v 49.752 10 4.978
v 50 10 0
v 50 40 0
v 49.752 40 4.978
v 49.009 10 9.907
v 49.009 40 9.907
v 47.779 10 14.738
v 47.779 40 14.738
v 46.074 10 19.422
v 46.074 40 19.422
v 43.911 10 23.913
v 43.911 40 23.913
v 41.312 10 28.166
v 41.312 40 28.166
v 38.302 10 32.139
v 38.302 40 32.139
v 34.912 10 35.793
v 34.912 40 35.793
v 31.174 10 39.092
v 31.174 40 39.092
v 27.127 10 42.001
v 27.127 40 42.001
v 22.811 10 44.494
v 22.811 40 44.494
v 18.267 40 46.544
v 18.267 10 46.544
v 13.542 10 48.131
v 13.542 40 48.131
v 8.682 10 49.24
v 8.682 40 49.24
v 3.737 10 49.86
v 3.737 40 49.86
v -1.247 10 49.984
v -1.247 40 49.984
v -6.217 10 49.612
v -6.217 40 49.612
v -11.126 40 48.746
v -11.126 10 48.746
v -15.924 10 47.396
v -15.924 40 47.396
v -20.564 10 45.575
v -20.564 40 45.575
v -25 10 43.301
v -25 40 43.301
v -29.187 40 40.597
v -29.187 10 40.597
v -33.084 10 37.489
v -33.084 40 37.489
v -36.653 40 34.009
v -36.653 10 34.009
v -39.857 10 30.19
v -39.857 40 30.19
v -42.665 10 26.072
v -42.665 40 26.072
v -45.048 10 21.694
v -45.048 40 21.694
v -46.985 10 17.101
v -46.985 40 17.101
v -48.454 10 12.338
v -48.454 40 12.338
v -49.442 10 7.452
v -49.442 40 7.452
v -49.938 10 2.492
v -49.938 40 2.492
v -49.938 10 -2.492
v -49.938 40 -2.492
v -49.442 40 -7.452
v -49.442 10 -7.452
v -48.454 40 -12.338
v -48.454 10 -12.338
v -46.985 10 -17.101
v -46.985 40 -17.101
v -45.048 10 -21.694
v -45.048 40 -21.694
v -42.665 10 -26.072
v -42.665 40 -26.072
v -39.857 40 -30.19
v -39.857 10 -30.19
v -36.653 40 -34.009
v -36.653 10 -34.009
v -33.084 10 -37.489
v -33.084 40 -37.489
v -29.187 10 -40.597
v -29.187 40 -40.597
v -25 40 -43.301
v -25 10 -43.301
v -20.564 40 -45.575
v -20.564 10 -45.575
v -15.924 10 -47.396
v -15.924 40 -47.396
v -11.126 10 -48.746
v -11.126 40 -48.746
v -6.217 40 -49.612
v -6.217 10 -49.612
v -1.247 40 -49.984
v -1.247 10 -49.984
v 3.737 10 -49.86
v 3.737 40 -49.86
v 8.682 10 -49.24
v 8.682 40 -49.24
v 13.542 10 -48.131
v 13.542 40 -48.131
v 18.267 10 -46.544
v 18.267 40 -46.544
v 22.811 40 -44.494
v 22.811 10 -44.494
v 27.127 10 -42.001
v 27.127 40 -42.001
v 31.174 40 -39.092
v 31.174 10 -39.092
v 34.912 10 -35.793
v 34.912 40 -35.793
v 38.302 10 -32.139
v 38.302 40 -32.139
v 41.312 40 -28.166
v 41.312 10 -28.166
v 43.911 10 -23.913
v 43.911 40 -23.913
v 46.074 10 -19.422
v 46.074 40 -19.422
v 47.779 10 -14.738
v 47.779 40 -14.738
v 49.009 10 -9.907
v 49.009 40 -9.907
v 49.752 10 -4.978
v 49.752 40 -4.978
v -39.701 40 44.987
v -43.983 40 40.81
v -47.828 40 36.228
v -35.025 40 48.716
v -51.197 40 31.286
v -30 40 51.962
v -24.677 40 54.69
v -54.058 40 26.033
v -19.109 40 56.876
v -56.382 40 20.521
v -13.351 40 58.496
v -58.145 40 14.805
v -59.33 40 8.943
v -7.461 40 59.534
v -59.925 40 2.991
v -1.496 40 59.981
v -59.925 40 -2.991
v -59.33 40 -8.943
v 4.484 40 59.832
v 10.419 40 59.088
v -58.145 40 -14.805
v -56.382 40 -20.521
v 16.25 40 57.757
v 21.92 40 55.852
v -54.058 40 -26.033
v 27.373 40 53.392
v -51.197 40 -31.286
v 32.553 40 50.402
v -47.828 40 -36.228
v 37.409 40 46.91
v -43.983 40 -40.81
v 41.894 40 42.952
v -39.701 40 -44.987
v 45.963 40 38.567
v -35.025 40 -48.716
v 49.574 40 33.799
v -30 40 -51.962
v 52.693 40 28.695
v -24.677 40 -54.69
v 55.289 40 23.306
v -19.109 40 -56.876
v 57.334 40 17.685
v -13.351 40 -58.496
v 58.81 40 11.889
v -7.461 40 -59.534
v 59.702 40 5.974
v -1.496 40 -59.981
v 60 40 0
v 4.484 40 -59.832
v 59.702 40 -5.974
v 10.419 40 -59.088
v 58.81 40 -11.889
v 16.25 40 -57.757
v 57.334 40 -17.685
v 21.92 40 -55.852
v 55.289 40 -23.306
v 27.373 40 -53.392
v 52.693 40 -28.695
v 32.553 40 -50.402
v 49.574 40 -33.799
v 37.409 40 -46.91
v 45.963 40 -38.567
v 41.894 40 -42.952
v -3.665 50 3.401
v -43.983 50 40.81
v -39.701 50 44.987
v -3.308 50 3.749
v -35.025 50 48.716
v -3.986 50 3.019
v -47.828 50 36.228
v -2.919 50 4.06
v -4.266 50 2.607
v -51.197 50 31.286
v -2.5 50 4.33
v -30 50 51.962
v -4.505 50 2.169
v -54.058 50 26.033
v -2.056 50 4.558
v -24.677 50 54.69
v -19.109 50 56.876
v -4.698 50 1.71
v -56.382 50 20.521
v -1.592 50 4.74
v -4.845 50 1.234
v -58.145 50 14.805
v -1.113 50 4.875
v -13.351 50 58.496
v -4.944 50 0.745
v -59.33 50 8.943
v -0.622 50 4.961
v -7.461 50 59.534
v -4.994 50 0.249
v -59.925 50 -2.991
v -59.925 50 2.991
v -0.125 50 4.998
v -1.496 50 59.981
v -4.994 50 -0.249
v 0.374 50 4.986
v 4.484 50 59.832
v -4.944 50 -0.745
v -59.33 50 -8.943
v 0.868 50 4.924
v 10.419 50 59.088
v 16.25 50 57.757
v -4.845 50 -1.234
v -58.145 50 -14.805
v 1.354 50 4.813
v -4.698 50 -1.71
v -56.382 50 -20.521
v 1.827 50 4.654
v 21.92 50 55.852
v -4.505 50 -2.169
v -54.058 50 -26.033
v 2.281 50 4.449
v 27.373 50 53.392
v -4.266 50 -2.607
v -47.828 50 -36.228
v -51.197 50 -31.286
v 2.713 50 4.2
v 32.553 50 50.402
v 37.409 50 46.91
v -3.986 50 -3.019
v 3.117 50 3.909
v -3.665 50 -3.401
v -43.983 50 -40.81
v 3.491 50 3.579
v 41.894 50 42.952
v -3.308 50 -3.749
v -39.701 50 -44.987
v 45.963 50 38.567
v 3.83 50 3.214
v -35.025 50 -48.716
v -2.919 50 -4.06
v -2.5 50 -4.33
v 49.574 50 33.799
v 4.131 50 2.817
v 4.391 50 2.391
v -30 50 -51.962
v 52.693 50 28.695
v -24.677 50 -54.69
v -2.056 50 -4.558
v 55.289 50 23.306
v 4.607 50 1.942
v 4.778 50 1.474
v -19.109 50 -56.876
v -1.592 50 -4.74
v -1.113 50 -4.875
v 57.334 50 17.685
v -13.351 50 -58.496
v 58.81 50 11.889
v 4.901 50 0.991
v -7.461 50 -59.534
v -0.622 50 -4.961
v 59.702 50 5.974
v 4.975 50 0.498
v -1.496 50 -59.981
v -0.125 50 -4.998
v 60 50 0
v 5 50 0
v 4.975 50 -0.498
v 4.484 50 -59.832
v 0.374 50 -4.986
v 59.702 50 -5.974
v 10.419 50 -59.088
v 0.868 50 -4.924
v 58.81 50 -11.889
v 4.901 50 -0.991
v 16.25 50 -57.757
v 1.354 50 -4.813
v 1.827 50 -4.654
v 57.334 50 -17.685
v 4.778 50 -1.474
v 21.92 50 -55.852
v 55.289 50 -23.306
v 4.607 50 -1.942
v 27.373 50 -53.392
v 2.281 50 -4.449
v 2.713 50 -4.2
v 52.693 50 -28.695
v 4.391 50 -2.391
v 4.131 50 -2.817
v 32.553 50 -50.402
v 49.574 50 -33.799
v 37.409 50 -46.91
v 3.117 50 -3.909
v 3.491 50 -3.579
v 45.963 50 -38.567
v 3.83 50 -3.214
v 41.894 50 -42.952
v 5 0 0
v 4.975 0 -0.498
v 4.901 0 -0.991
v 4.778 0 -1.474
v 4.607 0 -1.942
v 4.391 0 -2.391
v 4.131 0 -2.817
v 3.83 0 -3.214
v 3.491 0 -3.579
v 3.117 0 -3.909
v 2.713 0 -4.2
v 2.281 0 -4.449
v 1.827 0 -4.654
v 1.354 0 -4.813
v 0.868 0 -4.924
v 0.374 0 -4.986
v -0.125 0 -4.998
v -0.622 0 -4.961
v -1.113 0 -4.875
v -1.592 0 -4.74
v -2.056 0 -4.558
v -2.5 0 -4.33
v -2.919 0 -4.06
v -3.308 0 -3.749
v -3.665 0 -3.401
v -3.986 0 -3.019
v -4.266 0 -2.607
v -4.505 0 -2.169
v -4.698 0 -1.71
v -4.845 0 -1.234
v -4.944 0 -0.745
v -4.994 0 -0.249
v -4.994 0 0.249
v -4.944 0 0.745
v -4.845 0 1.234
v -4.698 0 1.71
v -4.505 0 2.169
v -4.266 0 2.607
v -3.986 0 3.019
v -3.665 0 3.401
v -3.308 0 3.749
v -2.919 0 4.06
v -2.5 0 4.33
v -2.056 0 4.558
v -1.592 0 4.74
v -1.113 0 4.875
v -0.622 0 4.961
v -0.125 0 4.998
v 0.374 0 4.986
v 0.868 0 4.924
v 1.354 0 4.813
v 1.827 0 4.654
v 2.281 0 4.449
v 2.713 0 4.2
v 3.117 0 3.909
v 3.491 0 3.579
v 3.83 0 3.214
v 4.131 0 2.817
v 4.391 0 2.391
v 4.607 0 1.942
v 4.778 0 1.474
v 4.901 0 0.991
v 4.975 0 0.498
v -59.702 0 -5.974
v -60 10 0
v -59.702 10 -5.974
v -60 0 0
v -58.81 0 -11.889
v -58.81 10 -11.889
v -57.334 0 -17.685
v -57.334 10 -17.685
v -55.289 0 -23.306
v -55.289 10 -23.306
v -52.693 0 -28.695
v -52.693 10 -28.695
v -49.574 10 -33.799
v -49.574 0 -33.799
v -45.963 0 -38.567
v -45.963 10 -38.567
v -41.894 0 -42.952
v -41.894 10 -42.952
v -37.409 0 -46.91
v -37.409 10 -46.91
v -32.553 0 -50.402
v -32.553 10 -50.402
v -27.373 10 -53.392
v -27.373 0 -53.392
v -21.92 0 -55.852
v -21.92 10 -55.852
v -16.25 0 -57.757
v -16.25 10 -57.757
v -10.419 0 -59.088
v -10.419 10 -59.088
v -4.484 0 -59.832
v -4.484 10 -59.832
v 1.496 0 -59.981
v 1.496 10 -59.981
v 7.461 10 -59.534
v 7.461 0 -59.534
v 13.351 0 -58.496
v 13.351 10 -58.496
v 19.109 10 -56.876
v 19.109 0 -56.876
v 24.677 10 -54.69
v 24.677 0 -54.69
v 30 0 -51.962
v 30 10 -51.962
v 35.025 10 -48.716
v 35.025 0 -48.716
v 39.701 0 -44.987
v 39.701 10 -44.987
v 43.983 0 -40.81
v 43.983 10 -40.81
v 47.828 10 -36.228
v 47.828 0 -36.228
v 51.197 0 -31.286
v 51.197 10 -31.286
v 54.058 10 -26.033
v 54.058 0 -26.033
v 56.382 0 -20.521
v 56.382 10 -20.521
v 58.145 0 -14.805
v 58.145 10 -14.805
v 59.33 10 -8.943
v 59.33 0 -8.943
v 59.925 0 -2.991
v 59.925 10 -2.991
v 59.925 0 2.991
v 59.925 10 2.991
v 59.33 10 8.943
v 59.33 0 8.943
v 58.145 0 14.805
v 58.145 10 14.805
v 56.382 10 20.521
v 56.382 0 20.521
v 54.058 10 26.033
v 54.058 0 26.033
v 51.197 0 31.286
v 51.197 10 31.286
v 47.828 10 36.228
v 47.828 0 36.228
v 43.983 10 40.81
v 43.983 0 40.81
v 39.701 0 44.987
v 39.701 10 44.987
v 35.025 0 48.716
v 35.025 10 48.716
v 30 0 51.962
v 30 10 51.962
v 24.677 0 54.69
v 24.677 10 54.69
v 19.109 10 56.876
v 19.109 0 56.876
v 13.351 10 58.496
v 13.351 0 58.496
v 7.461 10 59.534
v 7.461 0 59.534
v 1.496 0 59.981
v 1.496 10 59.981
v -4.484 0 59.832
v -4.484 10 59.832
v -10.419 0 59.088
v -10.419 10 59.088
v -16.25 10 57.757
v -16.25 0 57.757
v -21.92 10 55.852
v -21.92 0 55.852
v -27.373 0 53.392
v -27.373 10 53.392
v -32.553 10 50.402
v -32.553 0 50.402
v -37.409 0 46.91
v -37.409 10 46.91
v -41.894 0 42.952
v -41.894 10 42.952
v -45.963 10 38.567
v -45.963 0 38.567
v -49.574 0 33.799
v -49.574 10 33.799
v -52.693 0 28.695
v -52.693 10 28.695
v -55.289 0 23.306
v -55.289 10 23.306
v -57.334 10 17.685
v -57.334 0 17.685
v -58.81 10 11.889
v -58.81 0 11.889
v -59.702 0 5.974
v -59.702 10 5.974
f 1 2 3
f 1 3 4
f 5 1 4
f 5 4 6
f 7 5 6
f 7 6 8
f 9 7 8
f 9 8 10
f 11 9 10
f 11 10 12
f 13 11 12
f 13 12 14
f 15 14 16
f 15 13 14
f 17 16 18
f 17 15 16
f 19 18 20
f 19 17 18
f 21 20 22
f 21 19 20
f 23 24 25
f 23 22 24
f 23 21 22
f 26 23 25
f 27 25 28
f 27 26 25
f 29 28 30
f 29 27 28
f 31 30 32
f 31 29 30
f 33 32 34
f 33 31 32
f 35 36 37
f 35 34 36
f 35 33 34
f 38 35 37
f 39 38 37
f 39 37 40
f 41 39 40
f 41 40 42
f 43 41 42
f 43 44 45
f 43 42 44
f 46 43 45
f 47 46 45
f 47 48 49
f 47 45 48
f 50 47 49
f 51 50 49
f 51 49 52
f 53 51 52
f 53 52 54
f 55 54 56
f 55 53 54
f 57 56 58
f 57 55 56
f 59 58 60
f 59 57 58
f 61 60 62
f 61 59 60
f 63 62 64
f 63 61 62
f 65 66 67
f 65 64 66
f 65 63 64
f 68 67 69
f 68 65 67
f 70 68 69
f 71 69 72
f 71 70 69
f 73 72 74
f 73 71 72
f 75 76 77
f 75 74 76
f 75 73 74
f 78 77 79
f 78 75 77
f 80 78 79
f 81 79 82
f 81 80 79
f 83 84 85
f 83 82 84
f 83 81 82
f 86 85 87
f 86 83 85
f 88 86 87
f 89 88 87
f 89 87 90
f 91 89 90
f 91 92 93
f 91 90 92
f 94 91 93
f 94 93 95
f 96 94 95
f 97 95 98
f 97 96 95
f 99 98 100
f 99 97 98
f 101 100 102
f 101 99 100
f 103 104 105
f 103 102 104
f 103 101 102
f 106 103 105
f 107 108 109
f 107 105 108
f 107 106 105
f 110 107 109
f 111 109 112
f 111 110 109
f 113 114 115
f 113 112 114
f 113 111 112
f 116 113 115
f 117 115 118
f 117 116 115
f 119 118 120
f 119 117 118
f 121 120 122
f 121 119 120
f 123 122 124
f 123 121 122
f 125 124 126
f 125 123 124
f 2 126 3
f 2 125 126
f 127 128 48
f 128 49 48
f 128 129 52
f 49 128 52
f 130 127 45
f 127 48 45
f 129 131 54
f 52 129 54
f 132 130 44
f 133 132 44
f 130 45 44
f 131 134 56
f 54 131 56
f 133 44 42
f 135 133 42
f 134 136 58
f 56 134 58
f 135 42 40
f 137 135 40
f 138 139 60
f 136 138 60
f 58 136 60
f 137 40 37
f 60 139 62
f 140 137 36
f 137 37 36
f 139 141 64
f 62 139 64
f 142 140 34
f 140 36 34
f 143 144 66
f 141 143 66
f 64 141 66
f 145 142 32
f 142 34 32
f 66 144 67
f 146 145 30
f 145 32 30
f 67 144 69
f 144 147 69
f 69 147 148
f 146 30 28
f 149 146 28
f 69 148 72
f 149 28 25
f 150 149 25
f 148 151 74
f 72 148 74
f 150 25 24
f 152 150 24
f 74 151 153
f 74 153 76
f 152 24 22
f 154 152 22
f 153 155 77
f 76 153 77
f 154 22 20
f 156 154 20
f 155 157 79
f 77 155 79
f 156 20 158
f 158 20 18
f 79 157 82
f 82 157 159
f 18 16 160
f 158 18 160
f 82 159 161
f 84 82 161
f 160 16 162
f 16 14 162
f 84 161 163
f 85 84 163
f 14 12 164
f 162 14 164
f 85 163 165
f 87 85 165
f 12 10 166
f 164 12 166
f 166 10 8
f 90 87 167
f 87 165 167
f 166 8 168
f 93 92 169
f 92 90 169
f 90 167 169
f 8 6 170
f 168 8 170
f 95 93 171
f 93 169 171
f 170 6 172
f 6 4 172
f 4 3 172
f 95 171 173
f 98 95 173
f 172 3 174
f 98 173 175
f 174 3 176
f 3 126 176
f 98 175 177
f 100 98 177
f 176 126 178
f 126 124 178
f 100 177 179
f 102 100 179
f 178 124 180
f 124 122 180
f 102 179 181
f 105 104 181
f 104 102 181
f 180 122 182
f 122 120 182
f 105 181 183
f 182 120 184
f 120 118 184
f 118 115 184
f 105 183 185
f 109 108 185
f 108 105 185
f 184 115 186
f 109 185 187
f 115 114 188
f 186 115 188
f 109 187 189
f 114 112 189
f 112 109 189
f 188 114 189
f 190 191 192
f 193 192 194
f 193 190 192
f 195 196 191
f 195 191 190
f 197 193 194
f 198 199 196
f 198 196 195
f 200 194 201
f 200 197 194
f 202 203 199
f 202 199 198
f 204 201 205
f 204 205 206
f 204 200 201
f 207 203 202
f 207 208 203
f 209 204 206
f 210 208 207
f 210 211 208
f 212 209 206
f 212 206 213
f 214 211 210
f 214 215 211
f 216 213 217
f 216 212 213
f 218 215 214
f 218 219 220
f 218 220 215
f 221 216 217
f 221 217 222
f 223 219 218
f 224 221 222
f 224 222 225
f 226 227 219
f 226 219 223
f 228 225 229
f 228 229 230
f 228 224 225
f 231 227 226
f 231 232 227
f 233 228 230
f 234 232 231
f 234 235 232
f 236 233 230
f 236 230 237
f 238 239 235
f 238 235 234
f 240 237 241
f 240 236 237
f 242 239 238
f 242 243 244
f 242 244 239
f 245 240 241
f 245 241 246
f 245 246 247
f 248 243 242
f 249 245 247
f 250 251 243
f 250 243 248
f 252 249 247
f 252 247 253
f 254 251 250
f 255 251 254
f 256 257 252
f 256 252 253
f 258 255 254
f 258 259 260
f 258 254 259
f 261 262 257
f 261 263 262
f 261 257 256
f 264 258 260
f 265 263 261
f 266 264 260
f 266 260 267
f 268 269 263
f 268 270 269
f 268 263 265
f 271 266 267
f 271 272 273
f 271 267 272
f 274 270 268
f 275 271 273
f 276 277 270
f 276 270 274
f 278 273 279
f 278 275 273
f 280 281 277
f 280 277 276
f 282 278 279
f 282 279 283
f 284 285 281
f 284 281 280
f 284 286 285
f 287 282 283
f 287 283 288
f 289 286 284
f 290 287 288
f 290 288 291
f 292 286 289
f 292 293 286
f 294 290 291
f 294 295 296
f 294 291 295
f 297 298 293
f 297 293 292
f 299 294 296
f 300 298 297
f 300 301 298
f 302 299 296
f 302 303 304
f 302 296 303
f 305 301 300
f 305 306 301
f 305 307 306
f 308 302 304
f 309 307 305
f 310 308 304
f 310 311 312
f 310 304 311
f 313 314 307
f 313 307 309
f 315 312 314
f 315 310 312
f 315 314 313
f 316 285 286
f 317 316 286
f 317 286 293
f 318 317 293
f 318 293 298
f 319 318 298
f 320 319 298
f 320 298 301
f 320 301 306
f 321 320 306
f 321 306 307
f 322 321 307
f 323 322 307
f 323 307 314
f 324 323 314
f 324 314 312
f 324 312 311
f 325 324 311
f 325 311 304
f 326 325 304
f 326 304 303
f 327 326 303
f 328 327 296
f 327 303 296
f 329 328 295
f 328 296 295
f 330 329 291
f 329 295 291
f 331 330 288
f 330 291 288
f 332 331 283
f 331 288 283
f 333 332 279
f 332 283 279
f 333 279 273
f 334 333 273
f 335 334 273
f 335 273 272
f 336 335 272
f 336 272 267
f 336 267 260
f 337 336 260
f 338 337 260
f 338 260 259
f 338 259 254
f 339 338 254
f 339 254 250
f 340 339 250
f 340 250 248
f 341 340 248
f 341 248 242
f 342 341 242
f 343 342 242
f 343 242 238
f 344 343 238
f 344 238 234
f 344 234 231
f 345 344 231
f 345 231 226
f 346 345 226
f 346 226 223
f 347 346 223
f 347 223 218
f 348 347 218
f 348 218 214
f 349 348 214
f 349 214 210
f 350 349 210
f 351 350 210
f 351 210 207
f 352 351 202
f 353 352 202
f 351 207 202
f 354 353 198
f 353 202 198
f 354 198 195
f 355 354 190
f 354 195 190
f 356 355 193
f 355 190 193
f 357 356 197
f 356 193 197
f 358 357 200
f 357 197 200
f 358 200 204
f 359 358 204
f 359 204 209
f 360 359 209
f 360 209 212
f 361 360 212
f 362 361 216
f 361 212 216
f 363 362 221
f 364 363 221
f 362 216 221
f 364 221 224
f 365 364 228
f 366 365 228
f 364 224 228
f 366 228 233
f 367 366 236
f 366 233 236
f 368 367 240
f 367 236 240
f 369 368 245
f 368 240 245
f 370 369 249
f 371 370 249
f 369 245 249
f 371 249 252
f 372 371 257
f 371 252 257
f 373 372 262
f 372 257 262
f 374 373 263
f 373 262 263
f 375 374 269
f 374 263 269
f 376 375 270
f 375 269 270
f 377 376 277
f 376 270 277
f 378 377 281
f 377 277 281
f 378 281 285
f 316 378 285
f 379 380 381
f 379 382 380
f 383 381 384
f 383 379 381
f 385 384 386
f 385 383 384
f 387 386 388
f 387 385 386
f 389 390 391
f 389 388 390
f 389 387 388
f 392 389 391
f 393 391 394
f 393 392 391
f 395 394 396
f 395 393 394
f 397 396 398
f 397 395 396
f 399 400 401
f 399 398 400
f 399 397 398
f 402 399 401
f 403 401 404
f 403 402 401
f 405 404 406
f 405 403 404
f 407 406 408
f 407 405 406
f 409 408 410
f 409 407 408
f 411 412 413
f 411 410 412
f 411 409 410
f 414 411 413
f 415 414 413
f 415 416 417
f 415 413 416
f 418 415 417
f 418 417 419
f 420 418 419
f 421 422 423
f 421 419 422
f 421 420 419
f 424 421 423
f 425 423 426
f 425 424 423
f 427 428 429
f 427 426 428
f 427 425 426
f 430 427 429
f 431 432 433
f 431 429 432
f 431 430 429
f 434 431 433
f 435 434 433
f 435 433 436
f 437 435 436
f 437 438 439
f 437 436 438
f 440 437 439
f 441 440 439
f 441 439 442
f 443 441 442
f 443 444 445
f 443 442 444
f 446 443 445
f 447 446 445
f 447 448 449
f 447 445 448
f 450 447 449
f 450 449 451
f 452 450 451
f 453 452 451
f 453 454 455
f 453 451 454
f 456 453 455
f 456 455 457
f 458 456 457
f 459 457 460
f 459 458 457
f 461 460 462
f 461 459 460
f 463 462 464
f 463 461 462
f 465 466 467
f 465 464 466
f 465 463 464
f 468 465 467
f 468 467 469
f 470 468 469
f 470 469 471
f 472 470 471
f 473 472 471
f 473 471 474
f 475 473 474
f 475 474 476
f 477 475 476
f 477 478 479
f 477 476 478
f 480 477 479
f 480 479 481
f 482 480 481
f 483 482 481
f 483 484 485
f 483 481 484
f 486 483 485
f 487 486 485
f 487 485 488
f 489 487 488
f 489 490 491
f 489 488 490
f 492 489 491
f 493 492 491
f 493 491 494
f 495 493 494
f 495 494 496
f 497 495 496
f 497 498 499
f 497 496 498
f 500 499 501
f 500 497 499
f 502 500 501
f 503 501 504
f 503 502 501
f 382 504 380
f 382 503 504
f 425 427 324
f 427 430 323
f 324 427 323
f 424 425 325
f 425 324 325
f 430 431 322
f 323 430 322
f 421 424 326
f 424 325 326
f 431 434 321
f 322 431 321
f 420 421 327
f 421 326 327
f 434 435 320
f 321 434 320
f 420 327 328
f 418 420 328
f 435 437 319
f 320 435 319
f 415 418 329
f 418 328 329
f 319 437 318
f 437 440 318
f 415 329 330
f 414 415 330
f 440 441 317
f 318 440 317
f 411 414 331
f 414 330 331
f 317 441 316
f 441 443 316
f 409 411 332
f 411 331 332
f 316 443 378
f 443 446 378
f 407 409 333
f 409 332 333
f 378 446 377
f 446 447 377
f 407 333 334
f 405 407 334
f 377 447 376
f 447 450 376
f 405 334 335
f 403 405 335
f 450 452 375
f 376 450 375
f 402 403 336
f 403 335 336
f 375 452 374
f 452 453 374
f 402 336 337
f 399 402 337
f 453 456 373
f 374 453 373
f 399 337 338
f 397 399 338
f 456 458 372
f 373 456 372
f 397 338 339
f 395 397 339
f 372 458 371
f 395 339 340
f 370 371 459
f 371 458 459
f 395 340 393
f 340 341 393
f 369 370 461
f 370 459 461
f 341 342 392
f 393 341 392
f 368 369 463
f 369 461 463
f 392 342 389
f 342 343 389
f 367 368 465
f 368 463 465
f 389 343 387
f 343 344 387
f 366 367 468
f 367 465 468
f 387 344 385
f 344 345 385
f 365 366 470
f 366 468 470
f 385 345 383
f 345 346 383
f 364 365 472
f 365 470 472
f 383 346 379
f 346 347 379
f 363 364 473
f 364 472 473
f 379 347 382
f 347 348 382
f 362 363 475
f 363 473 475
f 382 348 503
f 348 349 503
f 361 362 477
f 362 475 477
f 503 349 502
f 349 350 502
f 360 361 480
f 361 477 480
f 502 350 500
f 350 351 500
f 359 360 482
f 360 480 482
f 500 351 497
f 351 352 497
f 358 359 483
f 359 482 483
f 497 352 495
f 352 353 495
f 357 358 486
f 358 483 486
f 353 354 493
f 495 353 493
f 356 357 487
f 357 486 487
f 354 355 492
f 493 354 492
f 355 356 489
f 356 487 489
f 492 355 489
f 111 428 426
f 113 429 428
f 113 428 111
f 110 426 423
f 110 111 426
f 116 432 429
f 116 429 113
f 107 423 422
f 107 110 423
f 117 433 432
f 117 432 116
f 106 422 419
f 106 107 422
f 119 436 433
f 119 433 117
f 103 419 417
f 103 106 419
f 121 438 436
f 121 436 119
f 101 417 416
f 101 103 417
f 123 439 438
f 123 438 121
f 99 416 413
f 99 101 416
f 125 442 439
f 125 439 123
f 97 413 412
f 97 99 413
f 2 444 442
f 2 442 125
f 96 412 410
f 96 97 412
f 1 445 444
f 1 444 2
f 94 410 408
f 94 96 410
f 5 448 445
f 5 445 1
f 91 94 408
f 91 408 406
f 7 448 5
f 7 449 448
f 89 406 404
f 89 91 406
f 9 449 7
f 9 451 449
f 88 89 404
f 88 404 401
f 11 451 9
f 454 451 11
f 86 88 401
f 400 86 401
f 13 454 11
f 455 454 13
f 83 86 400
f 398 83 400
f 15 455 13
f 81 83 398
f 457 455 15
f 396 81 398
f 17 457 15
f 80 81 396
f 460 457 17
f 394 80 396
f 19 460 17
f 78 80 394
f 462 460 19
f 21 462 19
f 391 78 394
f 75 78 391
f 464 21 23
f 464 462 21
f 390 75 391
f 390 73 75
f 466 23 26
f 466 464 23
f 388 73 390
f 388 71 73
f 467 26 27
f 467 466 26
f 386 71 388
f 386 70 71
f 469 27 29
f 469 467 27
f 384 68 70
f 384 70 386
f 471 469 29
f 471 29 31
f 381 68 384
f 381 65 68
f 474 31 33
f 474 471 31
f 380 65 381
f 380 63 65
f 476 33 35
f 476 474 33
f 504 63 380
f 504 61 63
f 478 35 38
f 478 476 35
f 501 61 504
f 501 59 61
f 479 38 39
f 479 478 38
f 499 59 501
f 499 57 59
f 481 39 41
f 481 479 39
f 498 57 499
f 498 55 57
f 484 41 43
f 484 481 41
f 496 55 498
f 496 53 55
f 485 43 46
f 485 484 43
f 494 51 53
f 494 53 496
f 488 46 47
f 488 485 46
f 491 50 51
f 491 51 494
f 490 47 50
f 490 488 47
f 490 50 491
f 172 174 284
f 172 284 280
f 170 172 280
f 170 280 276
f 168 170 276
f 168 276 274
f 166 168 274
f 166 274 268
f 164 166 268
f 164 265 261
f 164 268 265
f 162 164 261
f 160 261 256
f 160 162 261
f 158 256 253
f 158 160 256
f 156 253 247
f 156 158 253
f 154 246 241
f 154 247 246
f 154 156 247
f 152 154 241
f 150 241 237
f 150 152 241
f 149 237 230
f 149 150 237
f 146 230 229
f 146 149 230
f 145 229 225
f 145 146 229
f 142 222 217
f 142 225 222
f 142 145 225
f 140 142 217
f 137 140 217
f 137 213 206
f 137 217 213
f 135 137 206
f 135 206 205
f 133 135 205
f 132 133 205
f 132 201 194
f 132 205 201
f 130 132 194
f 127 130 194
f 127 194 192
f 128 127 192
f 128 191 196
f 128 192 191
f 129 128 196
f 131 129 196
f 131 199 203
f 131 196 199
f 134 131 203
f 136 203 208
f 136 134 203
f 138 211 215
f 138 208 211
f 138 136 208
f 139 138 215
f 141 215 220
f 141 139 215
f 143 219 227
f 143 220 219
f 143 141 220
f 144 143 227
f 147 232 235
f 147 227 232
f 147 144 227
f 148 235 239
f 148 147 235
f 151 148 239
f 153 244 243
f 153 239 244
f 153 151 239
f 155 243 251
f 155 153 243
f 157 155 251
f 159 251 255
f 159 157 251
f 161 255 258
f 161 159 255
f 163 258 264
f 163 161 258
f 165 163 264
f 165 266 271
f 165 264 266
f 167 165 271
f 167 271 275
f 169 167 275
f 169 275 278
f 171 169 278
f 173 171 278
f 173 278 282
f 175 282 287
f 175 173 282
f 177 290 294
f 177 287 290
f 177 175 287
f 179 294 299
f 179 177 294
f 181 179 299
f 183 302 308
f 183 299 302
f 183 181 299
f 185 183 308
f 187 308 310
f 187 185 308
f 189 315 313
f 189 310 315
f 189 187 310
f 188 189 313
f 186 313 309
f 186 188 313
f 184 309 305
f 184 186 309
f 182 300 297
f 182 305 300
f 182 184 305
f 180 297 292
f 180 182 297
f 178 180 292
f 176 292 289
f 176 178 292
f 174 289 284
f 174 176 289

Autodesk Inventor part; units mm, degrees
ref_plane "YZ Plane" through (0, 0, 0) normal (1, 0, 0) x (0, 1, 0)
ref_plane "XZ Plane" through (0, 0, 0) normal (0, 1, 0) x (-1, 0, 0)
ref_plane "XY Plane" through (0, 0, 0) normal (0, 0, 1) x (1, 0, 0)
sketch "Sketch1" plane through (0, 0, 0) normal (0, 1, 0) x (-1, 0, 0)
  circle A0 centre (0, 0) radius 60
  dimension "d0" = 120
extrude "Extrusion1" add sketch "Sketch1" along normal blind 10
sketch "Sketch2" plane through (0, 10, 0) normal (0, 1, 0) x (1, 0, 0)
  circle A0 centre (0, 0) radius 50
  dimension "d3" = 100
extrude "Extrusion2" add sketch "Sketch2" along normal blind 30
sketch "Sketch3" plane through (0, 40, 0) normal (0, 1, 0) x (1, 0, 0)
  circle A0 centre (0, 0) radius 60
  circle A1 centre (0, 0) radius 5
  dimension "d6" = 120
  dimension "d9" = 10
extrude "Extrusion3" add sketch "Sketch3" along normal blind 10 contours A0 | A1
sketch "Sketch5" plane through (0, 50, 0) normal (0, 1, 0) x (1, 0, 0)
  circle A0 centre (0, 0) radius 5
  dimension "d10" = 10
extrude "Extrusion4" cut sketch "Sketch5" against normal through all
properties part number "drivepulley"
